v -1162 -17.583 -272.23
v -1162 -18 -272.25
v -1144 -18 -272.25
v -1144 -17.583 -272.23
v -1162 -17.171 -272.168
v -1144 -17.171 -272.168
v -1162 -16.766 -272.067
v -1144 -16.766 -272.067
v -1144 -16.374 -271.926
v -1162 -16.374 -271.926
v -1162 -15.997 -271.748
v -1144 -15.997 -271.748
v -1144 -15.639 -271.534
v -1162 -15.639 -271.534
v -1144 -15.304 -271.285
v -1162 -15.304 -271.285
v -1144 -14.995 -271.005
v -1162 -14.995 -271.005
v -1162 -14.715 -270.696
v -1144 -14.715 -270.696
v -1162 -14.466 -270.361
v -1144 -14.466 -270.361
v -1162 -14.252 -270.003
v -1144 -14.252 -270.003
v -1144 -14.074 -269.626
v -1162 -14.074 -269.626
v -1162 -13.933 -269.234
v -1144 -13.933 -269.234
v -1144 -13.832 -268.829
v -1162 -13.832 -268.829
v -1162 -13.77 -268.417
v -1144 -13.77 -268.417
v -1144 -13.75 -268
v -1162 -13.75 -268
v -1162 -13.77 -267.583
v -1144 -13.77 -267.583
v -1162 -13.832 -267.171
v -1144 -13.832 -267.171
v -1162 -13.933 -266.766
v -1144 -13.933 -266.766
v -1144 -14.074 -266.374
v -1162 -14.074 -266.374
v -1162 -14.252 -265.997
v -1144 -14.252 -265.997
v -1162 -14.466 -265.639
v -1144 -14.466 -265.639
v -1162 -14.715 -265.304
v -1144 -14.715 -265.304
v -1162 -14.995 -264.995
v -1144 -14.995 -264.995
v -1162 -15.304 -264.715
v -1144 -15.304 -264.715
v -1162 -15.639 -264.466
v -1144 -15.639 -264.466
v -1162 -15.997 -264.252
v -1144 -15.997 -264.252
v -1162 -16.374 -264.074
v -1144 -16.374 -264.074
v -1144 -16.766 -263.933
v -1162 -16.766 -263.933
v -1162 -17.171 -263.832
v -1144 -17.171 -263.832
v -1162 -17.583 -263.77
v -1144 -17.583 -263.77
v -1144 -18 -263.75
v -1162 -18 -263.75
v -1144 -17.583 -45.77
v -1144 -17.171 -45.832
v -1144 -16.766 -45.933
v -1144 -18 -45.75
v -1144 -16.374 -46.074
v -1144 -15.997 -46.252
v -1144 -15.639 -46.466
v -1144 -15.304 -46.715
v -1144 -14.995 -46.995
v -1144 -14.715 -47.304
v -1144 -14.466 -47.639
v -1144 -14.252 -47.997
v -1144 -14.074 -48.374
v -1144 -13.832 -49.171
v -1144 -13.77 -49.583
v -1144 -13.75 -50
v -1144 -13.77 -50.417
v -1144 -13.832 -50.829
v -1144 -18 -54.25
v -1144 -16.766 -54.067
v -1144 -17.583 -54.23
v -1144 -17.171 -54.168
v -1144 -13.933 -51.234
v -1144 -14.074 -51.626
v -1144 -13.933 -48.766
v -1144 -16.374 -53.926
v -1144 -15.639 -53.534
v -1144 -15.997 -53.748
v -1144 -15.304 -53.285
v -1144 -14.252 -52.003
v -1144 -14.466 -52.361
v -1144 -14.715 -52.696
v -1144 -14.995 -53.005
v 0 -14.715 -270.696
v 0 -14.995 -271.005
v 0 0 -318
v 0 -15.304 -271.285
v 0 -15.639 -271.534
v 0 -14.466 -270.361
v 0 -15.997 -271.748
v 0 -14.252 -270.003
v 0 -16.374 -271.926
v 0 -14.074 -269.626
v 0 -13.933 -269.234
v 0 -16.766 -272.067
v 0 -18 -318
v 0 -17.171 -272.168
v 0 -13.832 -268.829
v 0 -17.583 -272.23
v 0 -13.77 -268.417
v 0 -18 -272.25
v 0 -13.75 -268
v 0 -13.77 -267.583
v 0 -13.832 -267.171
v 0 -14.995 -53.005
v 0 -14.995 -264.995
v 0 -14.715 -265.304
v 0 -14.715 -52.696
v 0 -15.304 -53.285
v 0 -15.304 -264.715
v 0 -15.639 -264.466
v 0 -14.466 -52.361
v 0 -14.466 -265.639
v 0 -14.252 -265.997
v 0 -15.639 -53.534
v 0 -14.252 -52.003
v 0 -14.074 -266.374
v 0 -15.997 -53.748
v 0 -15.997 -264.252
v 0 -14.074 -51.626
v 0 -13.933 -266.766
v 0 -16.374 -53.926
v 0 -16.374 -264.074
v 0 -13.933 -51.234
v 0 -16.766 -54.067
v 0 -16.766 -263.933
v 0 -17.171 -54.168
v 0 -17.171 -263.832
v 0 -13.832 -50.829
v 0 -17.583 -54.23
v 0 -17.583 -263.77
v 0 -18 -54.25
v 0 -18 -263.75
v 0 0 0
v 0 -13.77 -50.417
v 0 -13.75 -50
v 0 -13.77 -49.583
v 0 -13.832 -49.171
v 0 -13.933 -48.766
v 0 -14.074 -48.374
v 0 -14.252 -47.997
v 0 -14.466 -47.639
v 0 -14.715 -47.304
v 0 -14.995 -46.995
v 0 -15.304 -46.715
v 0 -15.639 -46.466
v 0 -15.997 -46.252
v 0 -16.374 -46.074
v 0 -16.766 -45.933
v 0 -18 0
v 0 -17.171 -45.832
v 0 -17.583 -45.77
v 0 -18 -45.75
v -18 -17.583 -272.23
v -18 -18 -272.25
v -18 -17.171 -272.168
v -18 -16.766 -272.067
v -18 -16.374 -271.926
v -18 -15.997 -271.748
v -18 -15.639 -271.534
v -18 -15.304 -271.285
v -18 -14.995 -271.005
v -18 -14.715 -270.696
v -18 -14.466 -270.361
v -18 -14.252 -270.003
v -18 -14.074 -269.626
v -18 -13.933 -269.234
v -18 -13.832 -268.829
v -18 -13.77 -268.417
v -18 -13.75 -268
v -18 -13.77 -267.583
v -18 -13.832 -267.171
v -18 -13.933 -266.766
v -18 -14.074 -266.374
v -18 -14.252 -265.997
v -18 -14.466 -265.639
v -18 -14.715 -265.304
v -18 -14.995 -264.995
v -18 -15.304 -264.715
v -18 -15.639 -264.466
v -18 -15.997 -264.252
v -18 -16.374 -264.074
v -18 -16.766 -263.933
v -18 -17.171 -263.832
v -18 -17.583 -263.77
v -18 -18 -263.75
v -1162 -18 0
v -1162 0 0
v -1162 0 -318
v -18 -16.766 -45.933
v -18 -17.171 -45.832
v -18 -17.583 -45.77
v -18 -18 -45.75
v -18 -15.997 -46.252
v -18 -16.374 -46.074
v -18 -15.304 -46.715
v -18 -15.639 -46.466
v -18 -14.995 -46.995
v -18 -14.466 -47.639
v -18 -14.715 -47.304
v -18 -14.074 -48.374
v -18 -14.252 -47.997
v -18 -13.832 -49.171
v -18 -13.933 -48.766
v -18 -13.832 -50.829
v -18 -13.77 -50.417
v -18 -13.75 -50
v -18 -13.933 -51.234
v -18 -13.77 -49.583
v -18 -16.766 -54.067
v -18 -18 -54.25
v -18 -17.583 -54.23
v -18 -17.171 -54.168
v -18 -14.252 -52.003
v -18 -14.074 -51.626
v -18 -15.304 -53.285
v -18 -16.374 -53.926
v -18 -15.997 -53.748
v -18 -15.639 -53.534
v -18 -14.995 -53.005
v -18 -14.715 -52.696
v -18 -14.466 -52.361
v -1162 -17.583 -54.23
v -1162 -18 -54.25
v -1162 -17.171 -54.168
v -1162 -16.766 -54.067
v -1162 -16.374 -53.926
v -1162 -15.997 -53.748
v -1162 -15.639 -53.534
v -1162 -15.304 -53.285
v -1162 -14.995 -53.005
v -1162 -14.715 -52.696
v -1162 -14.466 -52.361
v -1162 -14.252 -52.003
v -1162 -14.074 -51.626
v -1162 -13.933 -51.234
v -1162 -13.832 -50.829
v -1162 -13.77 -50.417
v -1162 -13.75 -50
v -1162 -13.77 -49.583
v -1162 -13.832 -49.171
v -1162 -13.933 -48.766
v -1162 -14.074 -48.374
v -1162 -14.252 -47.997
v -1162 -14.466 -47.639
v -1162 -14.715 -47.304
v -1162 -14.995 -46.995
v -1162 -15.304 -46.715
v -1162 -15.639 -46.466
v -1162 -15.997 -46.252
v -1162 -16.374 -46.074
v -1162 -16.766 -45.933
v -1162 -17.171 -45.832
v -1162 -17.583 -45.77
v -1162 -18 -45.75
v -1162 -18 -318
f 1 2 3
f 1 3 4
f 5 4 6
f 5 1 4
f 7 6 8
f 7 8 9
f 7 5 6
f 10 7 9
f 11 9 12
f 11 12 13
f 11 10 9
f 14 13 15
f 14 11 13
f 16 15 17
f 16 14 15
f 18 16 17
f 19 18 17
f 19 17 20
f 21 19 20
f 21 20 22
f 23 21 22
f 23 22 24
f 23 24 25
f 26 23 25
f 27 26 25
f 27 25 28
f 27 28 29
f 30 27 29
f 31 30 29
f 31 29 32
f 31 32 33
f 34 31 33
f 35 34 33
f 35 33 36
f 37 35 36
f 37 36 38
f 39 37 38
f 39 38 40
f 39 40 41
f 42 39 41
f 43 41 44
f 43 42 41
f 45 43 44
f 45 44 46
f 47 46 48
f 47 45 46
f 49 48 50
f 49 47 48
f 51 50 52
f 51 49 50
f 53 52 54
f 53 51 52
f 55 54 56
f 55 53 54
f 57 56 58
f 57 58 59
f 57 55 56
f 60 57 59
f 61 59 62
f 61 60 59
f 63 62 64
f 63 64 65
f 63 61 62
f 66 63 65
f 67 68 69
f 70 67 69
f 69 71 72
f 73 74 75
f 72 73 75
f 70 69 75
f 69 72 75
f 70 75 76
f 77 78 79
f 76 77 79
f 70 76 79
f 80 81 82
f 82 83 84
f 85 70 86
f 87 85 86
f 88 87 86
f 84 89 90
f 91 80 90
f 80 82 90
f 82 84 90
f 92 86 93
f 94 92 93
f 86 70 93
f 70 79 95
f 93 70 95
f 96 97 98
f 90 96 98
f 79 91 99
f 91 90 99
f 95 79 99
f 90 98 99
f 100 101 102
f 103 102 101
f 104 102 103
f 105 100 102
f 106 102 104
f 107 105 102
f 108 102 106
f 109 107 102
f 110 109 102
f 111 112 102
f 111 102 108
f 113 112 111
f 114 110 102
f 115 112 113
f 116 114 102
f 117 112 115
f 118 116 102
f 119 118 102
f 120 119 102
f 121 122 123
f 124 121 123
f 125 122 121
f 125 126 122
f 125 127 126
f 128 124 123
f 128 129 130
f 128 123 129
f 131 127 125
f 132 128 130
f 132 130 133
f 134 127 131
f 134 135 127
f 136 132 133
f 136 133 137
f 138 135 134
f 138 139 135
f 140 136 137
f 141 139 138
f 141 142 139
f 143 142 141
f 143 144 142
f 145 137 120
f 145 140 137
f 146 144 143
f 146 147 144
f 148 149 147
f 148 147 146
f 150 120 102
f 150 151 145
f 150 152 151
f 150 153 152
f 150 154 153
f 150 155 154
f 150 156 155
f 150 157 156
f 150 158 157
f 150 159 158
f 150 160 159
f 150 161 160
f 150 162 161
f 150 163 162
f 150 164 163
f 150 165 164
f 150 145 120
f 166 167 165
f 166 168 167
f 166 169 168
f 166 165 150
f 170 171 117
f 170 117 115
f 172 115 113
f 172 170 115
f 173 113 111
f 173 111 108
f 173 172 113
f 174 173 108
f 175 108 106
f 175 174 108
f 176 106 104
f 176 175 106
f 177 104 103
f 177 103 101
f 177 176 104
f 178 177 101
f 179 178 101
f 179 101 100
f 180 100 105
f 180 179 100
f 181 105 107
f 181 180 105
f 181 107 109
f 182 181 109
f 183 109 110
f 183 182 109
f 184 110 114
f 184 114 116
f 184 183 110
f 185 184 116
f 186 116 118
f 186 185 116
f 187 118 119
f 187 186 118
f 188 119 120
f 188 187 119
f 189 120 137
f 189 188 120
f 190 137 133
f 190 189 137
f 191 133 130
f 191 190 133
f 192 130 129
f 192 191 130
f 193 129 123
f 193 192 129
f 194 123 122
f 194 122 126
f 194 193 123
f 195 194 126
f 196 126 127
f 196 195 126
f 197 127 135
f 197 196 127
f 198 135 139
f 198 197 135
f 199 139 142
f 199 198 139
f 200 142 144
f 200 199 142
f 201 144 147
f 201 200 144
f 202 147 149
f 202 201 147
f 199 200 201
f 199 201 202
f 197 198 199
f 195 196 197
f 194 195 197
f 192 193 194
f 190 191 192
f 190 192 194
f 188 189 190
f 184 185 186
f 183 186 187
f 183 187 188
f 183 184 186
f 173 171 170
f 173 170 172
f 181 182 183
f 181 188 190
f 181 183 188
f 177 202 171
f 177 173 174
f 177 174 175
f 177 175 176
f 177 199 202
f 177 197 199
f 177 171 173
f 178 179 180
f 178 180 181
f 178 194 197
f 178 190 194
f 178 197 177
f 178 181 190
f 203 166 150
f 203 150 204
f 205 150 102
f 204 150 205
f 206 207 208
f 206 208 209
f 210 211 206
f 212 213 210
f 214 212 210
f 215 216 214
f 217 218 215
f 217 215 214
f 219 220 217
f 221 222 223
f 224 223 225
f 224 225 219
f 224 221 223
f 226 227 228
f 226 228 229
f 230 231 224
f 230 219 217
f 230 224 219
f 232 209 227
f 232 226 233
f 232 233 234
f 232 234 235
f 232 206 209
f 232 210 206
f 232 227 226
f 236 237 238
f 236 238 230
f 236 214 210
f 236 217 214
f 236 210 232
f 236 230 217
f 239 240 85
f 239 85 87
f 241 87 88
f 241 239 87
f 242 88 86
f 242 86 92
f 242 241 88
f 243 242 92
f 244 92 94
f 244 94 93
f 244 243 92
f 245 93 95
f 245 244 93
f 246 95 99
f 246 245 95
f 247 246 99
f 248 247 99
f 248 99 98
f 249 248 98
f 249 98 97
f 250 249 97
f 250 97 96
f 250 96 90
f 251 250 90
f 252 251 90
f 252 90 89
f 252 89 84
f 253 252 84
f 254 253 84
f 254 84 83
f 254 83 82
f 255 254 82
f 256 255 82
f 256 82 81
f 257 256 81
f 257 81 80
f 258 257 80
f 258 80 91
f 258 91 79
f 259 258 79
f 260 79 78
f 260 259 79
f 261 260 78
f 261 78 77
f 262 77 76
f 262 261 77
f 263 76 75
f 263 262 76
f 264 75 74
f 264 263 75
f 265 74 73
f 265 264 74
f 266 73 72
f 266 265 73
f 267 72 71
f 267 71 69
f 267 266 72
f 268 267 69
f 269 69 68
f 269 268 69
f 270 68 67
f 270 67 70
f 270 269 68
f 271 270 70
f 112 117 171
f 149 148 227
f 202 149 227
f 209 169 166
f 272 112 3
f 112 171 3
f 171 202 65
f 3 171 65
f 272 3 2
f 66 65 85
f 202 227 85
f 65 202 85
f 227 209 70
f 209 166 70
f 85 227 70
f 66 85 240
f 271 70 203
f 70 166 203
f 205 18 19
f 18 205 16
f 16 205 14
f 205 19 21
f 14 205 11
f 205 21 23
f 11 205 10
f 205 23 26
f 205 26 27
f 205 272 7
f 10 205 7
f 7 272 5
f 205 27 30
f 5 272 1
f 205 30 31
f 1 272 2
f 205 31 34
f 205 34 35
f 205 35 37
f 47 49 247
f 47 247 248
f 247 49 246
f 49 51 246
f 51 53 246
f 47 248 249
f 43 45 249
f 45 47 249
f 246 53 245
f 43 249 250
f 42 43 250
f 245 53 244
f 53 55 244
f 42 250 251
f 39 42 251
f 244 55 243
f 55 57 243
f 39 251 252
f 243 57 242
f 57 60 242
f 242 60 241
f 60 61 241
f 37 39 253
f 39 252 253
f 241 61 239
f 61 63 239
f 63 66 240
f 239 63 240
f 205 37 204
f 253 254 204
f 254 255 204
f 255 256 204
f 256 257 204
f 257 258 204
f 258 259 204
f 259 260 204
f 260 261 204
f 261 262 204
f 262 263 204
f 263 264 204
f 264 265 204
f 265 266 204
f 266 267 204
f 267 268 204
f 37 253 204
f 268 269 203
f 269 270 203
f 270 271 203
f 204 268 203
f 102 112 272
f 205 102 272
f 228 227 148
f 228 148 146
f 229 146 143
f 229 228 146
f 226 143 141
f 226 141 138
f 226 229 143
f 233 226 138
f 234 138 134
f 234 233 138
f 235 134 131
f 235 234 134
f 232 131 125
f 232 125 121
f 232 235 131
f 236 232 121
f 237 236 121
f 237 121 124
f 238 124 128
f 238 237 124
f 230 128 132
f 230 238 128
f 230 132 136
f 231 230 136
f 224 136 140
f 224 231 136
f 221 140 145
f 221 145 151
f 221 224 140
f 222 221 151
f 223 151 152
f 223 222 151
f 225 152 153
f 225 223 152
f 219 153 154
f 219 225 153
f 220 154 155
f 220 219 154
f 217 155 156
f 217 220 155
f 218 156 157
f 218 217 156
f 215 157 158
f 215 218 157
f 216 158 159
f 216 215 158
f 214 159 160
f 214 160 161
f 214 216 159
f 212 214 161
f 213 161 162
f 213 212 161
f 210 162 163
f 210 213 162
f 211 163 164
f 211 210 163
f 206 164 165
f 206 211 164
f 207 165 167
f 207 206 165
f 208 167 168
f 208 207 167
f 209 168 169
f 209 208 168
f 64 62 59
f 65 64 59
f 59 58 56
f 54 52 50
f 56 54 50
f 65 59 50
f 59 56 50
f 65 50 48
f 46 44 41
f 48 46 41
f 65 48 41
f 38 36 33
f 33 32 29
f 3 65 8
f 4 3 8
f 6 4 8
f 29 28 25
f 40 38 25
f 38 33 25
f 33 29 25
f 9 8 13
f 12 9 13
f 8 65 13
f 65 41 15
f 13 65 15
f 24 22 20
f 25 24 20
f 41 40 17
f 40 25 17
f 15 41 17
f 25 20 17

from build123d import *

# Parameters (mm, degrees)
SKETCH1_W       = 1162
SKETCH1_H       = 318
ADJ_SHELF_DEPTH = 18
SKETCH2_R       = 4.25
EXTRUDE3_DEPTH  = 18
EXTRUDE4_START  = -18
EXTRUDE4_DEPTH  = 18


with BuildPart() as part:
    # Sketch1 → Adj Shelf (new body)
    with BuildSketch(Plane(origin=(0, -18, 0), x_dir=(-1, 0, 0), z_dir=(0, 1, 0))):
        with Locations((581, -159)):
            Rectangle(SKETCH1_W, SKETCH1_H)
    extrude(amount=ADJ_SHELF_DEPTH)

    # Sketch2 → Extrude3 (cut)
    with BuildSketch(Plane(origin=(-1162, 0, 0), x_dir=(0, 0, -1), z_dir=(1, 0, 0))):
        with Locations((50, -18)):
            Circle(SKETCH2_R)
        with Locations((268, -18)):
            Circle(SKETCH2_R)
    extrude(amount=EXTRUDE3_DEPTH, mode=Mode.SUBTRACT)

    # Sketch4 → Extrude4 (cut)
    with BuildSketch(Plane(origin=(0, 0, 0), x_dir=(0, 0, -1), z_dir=(1, 0, 0)).offset(EXTRUDE4_START)):
        with BuildLine():
            Line((45.75, -18), (54.25, -18))
            ThreePointArc((54.25, -18), (50, -13.75), (45.75, -18))
        make_face()
        with BuildLine():
            Line((263.75, -18), (272.25, -18))
            ThreePointArc((272.25, -18), (268, -13.75), (263.75, -18))
        make_face()
    extrude(amount=EXTRUDE4_DEPTH, mode=Mode.SUBTRACT)


solid = part.part
